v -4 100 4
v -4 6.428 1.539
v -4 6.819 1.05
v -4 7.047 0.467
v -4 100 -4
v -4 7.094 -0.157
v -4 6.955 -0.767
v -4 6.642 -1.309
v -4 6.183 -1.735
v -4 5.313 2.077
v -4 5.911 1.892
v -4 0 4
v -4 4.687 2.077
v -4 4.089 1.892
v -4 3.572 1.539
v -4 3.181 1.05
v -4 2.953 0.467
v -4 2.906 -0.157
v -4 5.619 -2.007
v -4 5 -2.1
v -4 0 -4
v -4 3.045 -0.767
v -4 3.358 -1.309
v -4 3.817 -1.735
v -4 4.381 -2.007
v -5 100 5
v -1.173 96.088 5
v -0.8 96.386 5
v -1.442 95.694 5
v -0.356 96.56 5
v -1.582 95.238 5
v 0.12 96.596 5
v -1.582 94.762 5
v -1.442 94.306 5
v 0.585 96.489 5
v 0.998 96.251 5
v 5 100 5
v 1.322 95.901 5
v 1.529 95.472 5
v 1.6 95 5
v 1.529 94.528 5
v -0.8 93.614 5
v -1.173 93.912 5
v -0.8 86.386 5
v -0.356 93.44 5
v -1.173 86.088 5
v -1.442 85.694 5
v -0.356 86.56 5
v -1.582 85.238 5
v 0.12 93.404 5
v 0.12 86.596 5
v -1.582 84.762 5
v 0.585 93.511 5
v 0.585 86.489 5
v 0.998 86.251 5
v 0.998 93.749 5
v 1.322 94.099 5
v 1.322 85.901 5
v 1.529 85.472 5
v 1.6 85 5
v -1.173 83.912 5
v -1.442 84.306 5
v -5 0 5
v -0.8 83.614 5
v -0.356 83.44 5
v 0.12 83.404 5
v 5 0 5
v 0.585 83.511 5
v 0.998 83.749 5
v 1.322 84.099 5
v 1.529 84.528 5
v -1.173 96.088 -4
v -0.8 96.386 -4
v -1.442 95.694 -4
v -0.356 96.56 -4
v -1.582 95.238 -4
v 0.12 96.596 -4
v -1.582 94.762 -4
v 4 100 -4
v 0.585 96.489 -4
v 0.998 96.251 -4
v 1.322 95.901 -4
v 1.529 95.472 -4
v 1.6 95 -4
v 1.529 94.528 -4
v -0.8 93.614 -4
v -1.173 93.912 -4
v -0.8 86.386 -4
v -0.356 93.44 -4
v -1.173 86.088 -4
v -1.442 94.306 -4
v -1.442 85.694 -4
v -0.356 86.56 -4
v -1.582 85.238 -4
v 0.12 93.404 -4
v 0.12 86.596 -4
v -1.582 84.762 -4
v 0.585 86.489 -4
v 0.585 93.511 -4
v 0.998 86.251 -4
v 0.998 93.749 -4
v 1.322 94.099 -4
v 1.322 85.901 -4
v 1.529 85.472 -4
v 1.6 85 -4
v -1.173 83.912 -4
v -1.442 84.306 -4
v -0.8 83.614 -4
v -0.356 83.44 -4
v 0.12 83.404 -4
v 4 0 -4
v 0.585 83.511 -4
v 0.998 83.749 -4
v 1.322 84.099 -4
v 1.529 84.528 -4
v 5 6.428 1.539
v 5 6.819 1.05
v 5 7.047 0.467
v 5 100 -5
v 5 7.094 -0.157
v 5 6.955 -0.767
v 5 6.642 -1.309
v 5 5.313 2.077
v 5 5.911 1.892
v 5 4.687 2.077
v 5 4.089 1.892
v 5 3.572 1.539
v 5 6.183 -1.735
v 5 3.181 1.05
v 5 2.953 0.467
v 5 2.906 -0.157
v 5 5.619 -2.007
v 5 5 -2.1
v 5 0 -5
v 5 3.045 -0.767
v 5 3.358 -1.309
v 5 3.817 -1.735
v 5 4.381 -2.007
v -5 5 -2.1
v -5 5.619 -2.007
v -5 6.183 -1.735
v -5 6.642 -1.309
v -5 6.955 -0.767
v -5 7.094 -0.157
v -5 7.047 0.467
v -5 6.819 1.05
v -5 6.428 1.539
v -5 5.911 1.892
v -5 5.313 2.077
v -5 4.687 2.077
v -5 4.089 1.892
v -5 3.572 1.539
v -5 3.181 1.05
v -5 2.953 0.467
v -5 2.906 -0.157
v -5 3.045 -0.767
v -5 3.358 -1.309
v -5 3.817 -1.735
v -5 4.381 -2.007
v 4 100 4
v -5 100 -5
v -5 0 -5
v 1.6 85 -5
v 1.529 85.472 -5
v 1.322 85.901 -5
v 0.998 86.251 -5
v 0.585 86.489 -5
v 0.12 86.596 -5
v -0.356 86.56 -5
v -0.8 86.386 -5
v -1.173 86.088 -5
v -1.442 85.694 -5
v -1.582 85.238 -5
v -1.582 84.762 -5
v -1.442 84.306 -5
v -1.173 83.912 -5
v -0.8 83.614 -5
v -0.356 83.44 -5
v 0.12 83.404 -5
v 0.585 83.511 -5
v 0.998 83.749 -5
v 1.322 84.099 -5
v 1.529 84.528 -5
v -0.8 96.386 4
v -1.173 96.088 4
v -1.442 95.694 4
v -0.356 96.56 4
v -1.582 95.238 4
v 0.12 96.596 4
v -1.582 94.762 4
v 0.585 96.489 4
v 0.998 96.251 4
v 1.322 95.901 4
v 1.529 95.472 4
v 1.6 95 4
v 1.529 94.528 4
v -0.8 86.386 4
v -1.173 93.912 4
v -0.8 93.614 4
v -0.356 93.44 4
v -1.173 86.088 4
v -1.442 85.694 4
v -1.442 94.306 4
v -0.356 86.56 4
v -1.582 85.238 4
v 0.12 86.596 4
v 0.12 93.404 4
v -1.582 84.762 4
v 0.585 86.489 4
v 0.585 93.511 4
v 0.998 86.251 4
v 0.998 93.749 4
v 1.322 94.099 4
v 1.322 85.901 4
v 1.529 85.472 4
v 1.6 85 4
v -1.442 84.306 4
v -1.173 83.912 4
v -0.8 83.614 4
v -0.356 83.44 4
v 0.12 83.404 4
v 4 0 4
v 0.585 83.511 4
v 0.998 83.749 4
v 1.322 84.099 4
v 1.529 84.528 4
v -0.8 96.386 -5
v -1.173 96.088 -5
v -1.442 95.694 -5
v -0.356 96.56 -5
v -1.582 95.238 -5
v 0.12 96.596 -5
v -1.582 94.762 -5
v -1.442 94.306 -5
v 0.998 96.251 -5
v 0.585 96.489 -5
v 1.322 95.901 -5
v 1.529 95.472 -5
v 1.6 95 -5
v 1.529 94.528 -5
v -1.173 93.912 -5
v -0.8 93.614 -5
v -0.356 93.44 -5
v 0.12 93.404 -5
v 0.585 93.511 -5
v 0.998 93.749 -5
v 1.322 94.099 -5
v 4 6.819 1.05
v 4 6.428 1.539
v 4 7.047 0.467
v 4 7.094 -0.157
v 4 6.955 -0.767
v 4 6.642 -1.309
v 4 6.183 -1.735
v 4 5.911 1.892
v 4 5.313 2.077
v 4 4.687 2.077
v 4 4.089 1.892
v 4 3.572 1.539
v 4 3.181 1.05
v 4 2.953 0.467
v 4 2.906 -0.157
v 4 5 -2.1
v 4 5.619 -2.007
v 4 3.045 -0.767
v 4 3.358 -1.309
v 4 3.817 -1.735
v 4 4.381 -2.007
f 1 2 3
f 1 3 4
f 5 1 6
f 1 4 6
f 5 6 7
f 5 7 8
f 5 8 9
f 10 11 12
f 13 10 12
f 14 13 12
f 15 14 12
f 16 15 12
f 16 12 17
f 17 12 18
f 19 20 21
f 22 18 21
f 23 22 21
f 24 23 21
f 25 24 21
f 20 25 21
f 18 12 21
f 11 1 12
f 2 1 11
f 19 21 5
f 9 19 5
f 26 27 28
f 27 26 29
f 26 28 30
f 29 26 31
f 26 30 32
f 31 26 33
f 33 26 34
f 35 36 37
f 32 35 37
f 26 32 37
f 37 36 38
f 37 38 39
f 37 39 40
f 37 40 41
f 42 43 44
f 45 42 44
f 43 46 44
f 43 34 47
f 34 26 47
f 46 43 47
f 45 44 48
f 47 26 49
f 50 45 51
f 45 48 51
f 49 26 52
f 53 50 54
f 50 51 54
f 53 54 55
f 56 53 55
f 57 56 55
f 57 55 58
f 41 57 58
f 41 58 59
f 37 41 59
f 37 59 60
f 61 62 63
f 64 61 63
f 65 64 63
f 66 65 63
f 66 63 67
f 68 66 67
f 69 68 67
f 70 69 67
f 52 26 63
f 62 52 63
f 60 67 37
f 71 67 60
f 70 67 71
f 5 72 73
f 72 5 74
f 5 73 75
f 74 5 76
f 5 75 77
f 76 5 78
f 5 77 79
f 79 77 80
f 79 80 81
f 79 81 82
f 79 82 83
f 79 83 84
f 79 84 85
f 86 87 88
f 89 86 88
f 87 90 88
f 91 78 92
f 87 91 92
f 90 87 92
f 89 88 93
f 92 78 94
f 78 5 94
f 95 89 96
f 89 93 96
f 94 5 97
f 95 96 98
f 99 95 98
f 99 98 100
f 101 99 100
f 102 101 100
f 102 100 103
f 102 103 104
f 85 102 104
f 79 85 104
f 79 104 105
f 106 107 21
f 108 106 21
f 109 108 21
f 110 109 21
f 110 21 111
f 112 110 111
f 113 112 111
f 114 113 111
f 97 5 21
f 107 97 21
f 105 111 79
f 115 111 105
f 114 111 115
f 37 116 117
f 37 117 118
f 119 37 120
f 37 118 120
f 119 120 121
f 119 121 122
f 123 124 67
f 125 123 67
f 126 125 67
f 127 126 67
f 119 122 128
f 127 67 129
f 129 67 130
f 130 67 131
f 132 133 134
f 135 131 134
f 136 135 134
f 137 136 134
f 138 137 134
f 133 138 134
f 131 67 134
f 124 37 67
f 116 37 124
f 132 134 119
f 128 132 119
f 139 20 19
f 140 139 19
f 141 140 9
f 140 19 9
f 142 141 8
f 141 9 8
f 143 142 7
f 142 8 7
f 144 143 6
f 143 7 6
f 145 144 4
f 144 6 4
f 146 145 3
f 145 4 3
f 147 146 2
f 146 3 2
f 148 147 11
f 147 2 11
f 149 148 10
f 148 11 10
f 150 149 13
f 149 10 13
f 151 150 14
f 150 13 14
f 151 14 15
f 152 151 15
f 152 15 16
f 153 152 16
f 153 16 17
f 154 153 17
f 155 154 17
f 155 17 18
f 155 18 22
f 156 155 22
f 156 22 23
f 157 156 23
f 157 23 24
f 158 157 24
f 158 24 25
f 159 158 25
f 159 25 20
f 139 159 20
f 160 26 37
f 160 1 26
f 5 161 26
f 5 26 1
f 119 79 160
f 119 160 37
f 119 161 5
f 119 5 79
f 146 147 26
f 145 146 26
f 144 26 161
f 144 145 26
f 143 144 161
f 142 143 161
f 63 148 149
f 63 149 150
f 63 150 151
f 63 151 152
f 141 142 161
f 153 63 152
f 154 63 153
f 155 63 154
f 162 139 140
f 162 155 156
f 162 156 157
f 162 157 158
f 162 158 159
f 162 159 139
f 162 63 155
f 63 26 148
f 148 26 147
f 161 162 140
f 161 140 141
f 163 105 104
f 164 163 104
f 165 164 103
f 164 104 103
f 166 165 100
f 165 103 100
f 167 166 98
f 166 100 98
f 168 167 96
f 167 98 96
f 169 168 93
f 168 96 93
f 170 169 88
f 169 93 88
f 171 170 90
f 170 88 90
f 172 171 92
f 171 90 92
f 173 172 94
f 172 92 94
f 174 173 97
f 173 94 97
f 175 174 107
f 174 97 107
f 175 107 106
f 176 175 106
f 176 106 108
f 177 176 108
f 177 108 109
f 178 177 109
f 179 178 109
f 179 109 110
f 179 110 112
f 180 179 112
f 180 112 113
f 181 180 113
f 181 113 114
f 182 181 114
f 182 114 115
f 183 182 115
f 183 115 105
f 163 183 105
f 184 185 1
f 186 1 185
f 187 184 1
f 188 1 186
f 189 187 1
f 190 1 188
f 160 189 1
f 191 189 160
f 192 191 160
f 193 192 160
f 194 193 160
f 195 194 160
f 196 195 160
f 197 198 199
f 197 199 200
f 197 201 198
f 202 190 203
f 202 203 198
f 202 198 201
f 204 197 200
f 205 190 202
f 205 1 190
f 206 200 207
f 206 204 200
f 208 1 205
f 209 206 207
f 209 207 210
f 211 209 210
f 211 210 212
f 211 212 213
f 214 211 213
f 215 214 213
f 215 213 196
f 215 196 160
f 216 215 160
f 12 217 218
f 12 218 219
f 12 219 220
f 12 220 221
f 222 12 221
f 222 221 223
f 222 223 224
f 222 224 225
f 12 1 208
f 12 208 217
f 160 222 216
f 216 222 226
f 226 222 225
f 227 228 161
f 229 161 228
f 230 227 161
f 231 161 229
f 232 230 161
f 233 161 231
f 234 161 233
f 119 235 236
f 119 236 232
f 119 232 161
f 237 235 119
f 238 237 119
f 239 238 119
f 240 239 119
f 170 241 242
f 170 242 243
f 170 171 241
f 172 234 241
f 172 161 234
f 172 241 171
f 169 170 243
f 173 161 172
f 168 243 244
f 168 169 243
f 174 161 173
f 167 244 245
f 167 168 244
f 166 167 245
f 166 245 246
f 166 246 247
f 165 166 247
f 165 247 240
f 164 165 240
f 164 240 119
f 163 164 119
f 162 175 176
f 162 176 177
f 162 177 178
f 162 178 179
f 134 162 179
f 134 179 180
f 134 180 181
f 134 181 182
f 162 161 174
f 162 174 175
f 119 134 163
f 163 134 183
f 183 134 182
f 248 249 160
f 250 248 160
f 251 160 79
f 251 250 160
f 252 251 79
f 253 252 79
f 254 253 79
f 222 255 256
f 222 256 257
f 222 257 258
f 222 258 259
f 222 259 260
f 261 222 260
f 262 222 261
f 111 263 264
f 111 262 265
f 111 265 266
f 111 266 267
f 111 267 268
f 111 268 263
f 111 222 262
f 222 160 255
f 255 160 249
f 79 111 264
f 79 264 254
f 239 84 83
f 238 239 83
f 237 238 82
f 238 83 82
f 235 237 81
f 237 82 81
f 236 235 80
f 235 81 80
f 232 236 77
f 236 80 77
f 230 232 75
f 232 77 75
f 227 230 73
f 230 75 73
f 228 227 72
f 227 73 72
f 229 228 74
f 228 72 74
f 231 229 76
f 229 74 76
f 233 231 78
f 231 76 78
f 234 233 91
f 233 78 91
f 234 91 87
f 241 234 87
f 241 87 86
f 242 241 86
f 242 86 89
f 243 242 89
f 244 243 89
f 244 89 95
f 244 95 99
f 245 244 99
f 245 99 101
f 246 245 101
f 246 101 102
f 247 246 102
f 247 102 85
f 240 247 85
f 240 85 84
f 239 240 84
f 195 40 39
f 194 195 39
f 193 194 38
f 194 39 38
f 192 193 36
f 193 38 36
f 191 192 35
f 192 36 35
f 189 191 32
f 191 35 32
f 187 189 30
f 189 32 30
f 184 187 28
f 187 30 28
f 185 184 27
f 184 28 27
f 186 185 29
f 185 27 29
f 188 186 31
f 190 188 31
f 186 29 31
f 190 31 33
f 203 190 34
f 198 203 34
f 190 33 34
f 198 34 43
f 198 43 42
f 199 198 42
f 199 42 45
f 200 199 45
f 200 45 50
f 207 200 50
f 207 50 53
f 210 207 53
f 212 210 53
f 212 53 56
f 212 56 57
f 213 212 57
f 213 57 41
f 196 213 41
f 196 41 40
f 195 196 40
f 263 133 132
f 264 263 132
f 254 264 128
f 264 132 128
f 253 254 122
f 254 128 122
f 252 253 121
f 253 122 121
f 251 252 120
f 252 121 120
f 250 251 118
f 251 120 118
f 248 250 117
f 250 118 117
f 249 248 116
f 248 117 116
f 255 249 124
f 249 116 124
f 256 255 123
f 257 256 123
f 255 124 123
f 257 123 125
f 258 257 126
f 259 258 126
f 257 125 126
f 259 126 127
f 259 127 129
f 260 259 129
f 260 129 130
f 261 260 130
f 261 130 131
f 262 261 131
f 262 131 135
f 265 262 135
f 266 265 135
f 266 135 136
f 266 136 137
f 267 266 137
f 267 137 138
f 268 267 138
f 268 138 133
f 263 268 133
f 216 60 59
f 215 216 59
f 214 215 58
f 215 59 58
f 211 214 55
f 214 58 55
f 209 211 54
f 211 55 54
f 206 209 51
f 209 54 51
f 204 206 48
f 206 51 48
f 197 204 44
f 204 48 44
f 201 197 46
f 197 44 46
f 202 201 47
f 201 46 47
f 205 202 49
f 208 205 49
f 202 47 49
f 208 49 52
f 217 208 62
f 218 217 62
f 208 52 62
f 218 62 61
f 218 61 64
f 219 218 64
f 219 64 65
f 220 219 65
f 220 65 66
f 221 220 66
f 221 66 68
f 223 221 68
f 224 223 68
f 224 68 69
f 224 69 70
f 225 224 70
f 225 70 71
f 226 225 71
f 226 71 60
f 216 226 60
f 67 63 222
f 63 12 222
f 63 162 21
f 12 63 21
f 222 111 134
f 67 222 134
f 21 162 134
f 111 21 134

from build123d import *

# Parameters (mm, degrees)
SKETCH_1_W          = 10
SKETCH_1_H          = 10
SKETCH_1_W_2        = 8
SKETCH_1_H_2        = 8
EXTRUDE_1_DEPTH     = 100
SKETCH_2_R          = 2.1
CUT_EXTRUDE_1_DEPTH = 101.623058987
SKETCH_3_R          = 1.6
CUT_EXTRUDE_2_DEPTH = 101.623058987


with BuildPart() as part:
    # ｽｹｯﾁ1 → 押し出し-薄板1 (new body)
    with BuildSketch(Plane(origin=(0, 0, 0), x_dir=(1, 0, 0), z_dir=(0, 1, 0))):
        Rectangle(SKETCH_1_W, SKETCH_1_H)
        Rectangle(SKETCH_1_W_2, SKETCH_1_H_2, mode=Mode.SUBTRACT)
    extrude(amount=EXTRUDE_1_DEPTH)

    # ｽｹｯﾁ2 → ｶｯﾄ - 押し出し1 (cut, through all)
    with BuildSketch(Plane(origin=(5, 0, 0), x_dir=(0, 0, -1), z_dir=(1, 0, 0))):
        with Locations((0, 5)):
            Circle(SKETCH_2_R)
    extrude(amount=-CUT_EXTRUDE_1_DEPTH, mode=Mode.SUBTRACT)

    # ｽｹｯﾁ3 → ｶｯﾄ - 押し出し2 (cut, through all)
    with BuildSketch(Plane.XY.offset(5)):
        with Locations((0, 85)):
            Circle(SKETCH_3_R)
        with Locations((0, 95)):
            Circle(SKETCH_3_R)
    extrude(amount=-CUT_EXTRUDE_2_DEPTH, mode=Mode.SUBTRACT)


solid = part.part
